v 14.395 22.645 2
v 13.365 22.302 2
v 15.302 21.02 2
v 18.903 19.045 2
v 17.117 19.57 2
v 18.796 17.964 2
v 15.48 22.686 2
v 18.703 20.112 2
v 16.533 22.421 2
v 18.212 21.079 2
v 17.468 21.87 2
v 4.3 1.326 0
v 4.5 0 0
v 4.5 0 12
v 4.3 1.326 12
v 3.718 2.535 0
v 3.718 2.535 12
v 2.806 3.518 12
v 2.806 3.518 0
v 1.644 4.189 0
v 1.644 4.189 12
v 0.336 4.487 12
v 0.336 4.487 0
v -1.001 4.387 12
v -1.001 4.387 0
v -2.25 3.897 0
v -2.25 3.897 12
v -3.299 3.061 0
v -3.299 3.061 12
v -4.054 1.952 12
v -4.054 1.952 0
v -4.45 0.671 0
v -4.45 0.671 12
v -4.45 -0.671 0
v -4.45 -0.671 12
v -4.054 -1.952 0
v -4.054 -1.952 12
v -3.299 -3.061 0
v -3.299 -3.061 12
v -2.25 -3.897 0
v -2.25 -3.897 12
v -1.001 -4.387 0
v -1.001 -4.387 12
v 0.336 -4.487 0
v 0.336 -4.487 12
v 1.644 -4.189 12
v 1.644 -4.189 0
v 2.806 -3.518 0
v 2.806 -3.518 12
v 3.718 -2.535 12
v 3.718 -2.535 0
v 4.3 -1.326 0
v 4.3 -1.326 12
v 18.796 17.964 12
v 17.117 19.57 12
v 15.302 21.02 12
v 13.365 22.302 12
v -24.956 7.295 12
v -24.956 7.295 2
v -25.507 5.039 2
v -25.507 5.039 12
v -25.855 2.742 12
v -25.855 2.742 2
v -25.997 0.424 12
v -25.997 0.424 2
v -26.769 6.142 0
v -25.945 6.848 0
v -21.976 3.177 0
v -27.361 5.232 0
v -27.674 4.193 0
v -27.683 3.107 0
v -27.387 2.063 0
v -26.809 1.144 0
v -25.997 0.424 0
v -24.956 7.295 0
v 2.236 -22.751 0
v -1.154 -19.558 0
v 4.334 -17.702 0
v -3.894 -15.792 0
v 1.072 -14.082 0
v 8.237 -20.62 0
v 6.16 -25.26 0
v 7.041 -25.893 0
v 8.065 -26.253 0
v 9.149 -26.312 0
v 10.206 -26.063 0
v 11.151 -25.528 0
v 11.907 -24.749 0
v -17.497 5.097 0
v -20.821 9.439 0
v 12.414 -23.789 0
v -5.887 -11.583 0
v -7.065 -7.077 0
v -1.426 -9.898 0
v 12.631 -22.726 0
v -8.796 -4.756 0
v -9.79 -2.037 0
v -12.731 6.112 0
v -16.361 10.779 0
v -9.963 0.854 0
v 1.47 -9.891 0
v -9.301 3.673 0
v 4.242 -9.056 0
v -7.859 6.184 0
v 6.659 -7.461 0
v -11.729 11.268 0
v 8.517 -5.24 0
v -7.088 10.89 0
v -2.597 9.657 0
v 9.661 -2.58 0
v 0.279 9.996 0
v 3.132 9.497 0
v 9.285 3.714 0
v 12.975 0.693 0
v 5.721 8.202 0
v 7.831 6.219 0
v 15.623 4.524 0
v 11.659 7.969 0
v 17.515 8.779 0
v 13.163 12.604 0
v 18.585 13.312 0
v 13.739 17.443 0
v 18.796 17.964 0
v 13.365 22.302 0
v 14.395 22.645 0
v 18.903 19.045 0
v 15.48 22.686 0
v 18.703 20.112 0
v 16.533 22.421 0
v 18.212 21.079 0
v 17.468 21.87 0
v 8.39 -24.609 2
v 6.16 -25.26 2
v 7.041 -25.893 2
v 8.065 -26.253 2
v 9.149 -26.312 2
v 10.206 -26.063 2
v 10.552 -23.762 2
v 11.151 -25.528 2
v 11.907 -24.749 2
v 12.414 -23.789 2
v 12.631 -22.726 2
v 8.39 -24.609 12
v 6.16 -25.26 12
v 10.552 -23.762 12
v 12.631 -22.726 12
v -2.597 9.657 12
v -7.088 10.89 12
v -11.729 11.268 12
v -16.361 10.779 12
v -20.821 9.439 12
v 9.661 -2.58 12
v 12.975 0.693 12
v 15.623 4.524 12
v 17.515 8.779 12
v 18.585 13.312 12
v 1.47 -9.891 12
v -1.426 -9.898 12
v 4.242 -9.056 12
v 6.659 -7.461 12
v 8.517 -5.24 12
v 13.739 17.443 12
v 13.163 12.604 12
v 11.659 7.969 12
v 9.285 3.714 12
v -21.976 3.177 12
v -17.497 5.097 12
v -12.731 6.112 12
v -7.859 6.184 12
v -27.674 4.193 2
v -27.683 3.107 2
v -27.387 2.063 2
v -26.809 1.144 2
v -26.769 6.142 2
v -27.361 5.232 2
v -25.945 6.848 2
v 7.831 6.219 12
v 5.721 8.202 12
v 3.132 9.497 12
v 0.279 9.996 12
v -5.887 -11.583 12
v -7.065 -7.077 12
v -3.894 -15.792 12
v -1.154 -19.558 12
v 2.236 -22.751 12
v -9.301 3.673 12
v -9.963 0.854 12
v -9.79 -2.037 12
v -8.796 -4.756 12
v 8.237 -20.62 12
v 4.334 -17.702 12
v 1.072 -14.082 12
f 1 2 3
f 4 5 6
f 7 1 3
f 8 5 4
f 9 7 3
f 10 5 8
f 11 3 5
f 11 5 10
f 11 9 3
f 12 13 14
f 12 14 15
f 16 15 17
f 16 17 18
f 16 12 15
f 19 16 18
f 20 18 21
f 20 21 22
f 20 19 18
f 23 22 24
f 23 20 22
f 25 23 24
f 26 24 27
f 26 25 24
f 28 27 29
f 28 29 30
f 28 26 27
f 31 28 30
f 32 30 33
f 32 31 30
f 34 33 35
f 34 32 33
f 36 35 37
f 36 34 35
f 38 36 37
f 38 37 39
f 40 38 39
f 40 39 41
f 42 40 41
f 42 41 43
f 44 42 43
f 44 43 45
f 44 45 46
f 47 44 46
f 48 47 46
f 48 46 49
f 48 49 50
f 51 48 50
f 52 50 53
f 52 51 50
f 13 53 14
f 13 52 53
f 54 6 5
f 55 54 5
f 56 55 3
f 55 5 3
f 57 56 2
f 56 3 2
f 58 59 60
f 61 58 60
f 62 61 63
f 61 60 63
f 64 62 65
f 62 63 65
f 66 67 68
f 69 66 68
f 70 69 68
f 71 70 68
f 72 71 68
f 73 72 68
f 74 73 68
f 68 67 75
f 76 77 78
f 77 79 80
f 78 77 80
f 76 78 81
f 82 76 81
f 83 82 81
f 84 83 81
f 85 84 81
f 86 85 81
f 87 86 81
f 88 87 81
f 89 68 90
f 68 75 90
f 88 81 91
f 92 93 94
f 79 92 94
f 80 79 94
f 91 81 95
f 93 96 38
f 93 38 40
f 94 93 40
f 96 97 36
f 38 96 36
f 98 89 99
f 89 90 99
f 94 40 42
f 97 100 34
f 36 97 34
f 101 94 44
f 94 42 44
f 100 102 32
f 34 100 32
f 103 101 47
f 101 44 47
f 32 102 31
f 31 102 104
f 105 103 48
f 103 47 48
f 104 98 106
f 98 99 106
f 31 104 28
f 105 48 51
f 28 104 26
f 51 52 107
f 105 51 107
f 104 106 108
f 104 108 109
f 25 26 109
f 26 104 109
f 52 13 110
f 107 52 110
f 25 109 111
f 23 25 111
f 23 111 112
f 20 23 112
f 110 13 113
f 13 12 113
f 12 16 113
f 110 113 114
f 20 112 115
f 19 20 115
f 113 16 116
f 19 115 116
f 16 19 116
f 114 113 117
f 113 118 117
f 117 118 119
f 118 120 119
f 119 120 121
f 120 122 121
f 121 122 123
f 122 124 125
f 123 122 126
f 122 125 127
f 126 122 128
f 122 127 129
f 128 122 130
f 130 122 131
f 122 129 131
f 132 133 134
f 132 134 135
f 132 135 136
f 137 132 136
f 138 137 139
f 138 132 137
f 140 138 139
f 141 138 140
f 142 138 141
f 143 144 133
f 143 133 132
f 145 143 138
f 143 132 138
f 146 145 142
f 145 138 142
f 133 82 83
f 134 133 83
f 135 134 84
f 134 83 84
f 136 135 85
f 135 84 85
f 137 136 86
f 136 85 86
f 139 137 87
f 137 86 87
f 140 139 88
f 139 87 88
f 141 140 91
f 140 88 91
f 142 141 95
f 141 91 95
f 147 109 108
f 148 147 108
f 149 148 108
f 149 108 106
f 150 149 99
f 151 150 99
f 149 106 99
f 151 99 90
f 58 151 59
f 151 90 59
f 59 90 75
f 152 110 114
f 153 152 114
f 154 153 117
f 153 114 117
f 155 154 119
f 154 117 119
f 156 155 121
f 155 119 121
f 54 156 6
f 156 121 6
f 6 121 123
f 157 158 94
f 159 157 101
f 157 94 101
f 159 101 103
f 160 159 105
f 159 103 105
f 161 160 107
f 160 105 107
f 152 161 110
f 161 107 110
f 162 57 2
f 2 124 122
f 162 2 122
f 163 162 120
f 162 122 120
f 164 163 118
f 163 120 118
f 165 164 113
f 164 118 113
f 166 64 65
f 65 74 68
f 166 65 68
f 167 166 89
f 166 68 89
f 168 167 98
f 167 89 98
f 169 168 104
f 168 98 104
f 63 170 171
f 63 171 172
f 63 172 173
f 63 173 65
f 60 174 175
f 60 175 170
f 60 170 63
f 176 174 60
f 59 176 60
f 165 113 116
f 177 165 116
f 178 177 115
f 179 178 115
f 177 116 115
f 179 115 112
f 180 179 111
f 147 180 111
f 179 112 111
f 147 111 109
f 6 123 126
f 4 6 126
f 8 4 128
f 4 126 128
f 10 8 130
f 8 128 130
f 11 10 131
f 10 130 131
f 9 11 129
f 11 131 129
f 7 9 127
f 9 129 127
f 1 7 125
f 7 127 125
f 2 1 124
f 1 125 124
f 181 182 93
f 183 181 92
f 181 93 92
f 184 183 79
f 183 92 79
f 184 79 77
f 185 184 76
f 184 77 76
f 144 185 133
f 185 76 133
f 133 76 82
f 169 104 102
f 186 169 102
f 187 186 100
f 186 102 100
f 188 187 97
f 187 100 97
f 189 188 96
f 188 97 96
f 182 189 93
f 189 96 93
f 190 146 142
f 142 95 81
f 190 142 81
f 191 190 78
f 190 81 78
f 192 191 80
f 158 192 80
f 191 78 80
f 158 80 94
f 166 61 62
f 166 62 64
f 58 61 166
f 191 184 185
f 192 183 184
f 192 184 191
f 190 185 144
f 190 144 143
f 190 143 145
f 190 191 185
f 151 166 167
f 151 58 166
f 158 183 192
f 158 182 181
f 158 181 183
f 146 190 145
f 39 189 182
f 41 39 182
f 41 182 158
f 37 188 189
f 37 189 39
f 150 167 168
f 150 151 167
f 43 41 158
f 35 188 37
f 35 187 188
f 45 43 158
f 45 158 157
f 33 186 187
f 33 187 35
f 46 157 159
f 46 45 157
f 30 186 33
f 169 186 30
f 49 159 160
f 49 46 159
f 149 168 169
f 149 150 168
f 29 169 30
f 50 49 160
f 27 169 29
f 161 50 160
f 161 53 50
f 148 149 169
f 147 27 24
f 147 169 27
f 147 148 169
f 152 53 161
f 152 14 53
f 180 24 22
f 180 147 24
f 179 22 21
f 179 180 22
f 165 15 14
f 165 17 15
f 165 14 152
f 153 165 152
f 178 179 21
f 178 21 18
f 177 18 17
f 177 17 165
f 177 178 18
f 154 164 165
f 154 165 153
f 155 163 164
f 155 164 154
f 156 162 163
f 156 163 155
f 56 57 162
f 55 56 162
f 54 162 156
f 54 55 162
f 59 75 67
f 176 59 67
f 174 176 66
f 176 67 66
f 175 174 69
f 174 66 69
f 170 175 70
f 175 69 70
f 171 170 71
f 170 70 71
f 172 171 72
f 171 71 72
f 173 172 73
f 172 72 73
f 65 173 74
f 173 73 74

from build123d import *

# Parameters (mm, degrees)
F0_R     = 4.5
F1_DEPTH = 12
F2_DEPTH = 2


with BuildPart() as f1:
    # F0 (on Top) → F1 (new body)
    with BuildSketch(Plane.XY):
        with BuildLine():
            ThreePointArc((-7.85878, 6.183815), (-5.508567, 8.345998), (-2.59656, 9.657012))
            ThreePointArc((-2.59656, 9.657012), (-14.056504, 11.131503), (-24.955515, 7.29536))
            ThreePointArc((-24.955515, 7.29536), (-25.706653, 3.894607), (-25.996543, 0.423975))
            ThreePointArc((-25.996543, 0.423975), (-17.497151, 5.097221), (-7.85878, 6.183815))
        make_face()
        with BuildLine():
            ThreePointArc((9.284731, 3.713996), (9.819555, 1.891122), (10, 0))
            ThreePointArc((10, 0), (9.915013, -1.300966), (9.661498, -2.579819))
            ThreePointArc((9.661498, -2.579819), (16.668417, 6.607538), (18.795724, 17.96443))
            ThreePointArc((18.795724, 17.96443), (16.226156, 20.315311), (13.365445, 22.301679))
            ThreePointArc((13.365445, 22.301679), (13.162898, 12.604367), (9.284731, 3.713996))
        make_face()
        with BuildLine():
            ThreePointArc((9.661498, -2.579819), (9.915013, -1.300966), (10, 0))
            ThreePointArc((10, 0), (9.819555, 1.891122), (9.284731, 3.713996))
            ThreePointArc((9.284731, 3.713996), (4.473563, 8.943558), (-2.59656, 9.657012))
            ThreePointArc((-2.59656, 9.657012), (-5.508567, 8.345998), (-7.85878, 6.183815))
            ThreePointArc((-7.85878, 6.183815), (-9.98213, -0.59756), (-7.064937, -7.077193))
            ThreePointArc((-7.064937, -7.077193), (-4.473563, -8.943558), (-1.425951, -9.897811))
            ThreePointArc((-1.425951, -9.897811), (5.508567, -8.345998), (9.661498, -2.579819))
        make_face()
        Circle(F0_R, mode=Mode.SUBTRACT)
        with BuildLine():
            ThreePointArc((12.631098, -22.725654), (4.334253, -17.701588), (-1.425951, -9.897811))
            ThreePointArc((-1.425951, -9.897811), (-4.473563, -8.943558), (-7.064937, -7.077193))
            ThreePointArc((-7.064937, -7.077193), (-2.611913, -17.739041), (6.159791, -25.25979))
            ThreePointArc((6.159791, -25.25979), (9.480498, -24.209919), (12.631098, -22.725654))
        make_face()
    extrude(amount=F1_DEPTH)

    # F0 (on Top) → F2 (join)
    with BuildSketch(Plane.XY):
        with BuildLine():
            ThreePointArc((-25.996543, 0.423975), (-25.706653, 3.894607), (-24.955515, 7.29536))
            ThreePointArc((-24.955515, 7.29536), (-27.674447, 4.192732), (-25.996543, 0.423975))
        make_face()
        with BuildLine():
            ThreePointArc((6.159791, -25.25979), (10.206211, -26.06314), (12.631098, -22.725654))
            ThreePointArc((12.631098, -22.725654), (9.480498, -24.209919), (6.159791, -25.25979))
        make_face()
        with BuildLine():
            ThreePointArc((18.795724, 17.96443), (17.468236, 21.870408), (13.365445, 22.301679))
            ThreePointArc((13.365445, 22.301679), (16.226156, 20.315311), (18.795724, 17.96443))
        make_face()
    extrude(amount=F2_DEPTH)


solid = f1.part
